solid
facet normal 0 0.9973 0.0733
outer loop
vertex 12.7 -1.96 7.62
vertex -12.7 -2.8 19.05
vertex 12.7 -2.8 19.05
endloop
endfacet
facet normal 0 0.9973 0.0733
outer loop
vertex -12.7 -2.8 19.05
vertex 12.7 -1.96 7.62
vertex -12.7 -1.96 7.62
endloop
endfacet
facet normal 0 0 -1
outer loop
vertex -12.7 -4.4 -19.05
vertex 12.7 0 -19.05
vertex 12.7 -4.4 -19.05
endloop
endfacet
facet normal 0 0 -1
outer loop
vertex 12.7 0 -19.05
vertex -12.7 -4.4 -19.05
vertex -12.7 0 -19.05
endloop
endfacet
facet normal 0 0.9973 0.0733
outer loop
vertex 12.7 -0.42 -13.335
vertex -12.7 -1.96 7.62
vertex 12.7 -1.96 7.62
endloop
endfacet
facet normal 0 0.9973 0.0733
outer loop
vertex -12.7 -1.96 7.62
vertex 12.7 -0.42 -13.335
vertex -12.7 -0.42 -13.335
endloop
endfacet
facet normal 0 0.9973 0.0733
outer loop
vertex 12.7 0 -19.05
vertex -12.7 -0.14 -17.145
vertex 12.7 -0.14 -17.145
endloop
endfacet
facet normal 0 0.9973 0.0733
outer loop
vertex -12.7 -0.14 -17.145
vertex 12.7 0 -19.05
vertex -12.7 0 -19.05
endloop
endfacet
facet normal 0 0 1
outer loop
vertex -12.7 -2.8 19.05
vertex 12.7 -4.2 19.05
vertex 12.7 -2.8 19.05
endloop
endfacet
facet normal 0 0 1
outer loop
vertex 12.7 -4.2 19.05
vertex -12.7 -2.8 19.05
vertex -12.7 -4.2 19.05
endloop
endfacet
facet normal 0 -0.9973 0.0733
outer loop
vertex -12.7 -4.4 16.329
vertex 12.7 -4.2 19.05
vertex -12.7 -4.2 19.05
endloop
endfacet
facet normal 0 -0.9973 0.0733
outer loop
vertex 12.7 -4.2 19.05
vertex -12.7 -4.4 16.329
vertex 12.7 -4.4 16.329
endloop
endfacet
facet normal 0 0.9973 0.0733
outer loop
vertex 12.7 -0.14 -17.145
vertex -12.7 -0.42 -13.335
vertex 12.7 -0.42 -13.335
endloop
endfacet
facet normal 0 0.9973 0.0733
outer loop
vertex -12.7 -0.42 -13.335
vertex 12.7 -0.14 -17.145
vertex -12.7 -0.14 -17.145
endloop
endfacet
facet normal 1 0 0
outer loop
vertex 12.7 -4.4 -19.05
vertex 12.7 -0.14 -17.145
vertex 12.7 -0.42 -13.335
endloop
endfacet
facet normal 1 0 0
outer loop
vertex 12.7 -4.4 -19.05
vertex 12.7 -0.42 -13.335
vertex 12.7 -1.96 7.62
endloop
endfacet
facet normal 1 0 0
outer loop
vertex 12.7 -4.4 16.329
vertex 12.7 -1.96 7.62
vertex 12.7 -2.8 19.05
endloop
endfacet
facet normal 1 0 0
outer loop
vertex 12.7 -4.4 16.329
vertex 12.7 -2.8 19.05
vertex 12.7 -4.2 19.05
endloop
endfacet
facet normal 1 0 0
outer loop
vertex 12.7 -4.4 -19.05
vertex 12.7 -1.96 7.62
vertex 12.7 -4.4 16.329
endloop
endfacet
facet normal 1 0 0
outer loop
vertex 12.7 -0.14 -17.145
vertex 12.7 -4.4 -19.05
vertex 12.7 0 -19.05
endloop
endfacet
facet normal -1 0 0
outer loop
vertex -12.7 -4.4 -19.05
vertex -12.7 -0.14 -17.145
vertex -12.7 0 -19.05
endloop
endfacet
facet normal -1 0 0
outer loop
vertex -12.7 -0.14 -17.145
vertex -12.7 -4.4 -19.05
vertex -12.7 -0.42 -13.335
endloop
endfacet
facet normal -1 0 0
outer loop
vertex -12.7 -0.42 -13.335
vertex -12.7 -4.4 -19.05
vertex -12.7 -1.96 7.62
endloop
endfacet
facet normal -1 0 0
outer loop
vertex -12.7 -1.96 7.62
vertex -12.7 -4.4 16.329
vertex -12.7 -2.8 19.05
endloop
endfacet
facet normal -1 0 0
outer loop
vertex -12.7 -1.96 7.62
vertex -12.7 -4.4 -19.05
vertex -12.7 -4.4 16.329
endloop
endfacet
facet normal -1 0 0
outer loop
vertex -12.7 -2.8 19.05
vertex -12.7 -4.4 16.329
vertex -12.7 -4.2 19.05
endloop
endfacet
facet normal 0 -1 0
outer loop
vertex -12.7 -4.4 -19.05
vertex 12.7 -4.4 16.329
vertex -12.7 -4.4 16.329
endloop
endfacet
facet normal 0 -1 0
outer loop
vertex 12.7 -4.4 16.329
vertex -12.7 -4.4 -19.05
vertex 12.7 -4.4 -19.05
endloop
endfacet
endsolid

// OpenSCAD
TaperCube(X_Dim = 25.4, Y_Dim = 7, Z_Dim = 38.1);

// Tapered cube on one side straight on one side
module TaperCube(X_Dim, Y_Dim, Z_Dim, Taper_Big = 1, Small_Taper = .2, Center = true, )

{
    difference()
    {
        translate([ 0, -Y_Dim / 2, 0 ]) linear_extrude(height = Z_Dim, scale = [ Taper_Big, Small_Taper ],
                                                       center = true) // flattend tapered rod .093/.1642
            square(
                [
                    X_Dim,
                    Y_Dim,
                ],
                center = Center);

        translate([ 0, -Y_Dim - .90, 0 ]) cube([ X_Dim + 2.0, Y_Dim, Z_Dim + 1.0 ], center = true);
    }
}
